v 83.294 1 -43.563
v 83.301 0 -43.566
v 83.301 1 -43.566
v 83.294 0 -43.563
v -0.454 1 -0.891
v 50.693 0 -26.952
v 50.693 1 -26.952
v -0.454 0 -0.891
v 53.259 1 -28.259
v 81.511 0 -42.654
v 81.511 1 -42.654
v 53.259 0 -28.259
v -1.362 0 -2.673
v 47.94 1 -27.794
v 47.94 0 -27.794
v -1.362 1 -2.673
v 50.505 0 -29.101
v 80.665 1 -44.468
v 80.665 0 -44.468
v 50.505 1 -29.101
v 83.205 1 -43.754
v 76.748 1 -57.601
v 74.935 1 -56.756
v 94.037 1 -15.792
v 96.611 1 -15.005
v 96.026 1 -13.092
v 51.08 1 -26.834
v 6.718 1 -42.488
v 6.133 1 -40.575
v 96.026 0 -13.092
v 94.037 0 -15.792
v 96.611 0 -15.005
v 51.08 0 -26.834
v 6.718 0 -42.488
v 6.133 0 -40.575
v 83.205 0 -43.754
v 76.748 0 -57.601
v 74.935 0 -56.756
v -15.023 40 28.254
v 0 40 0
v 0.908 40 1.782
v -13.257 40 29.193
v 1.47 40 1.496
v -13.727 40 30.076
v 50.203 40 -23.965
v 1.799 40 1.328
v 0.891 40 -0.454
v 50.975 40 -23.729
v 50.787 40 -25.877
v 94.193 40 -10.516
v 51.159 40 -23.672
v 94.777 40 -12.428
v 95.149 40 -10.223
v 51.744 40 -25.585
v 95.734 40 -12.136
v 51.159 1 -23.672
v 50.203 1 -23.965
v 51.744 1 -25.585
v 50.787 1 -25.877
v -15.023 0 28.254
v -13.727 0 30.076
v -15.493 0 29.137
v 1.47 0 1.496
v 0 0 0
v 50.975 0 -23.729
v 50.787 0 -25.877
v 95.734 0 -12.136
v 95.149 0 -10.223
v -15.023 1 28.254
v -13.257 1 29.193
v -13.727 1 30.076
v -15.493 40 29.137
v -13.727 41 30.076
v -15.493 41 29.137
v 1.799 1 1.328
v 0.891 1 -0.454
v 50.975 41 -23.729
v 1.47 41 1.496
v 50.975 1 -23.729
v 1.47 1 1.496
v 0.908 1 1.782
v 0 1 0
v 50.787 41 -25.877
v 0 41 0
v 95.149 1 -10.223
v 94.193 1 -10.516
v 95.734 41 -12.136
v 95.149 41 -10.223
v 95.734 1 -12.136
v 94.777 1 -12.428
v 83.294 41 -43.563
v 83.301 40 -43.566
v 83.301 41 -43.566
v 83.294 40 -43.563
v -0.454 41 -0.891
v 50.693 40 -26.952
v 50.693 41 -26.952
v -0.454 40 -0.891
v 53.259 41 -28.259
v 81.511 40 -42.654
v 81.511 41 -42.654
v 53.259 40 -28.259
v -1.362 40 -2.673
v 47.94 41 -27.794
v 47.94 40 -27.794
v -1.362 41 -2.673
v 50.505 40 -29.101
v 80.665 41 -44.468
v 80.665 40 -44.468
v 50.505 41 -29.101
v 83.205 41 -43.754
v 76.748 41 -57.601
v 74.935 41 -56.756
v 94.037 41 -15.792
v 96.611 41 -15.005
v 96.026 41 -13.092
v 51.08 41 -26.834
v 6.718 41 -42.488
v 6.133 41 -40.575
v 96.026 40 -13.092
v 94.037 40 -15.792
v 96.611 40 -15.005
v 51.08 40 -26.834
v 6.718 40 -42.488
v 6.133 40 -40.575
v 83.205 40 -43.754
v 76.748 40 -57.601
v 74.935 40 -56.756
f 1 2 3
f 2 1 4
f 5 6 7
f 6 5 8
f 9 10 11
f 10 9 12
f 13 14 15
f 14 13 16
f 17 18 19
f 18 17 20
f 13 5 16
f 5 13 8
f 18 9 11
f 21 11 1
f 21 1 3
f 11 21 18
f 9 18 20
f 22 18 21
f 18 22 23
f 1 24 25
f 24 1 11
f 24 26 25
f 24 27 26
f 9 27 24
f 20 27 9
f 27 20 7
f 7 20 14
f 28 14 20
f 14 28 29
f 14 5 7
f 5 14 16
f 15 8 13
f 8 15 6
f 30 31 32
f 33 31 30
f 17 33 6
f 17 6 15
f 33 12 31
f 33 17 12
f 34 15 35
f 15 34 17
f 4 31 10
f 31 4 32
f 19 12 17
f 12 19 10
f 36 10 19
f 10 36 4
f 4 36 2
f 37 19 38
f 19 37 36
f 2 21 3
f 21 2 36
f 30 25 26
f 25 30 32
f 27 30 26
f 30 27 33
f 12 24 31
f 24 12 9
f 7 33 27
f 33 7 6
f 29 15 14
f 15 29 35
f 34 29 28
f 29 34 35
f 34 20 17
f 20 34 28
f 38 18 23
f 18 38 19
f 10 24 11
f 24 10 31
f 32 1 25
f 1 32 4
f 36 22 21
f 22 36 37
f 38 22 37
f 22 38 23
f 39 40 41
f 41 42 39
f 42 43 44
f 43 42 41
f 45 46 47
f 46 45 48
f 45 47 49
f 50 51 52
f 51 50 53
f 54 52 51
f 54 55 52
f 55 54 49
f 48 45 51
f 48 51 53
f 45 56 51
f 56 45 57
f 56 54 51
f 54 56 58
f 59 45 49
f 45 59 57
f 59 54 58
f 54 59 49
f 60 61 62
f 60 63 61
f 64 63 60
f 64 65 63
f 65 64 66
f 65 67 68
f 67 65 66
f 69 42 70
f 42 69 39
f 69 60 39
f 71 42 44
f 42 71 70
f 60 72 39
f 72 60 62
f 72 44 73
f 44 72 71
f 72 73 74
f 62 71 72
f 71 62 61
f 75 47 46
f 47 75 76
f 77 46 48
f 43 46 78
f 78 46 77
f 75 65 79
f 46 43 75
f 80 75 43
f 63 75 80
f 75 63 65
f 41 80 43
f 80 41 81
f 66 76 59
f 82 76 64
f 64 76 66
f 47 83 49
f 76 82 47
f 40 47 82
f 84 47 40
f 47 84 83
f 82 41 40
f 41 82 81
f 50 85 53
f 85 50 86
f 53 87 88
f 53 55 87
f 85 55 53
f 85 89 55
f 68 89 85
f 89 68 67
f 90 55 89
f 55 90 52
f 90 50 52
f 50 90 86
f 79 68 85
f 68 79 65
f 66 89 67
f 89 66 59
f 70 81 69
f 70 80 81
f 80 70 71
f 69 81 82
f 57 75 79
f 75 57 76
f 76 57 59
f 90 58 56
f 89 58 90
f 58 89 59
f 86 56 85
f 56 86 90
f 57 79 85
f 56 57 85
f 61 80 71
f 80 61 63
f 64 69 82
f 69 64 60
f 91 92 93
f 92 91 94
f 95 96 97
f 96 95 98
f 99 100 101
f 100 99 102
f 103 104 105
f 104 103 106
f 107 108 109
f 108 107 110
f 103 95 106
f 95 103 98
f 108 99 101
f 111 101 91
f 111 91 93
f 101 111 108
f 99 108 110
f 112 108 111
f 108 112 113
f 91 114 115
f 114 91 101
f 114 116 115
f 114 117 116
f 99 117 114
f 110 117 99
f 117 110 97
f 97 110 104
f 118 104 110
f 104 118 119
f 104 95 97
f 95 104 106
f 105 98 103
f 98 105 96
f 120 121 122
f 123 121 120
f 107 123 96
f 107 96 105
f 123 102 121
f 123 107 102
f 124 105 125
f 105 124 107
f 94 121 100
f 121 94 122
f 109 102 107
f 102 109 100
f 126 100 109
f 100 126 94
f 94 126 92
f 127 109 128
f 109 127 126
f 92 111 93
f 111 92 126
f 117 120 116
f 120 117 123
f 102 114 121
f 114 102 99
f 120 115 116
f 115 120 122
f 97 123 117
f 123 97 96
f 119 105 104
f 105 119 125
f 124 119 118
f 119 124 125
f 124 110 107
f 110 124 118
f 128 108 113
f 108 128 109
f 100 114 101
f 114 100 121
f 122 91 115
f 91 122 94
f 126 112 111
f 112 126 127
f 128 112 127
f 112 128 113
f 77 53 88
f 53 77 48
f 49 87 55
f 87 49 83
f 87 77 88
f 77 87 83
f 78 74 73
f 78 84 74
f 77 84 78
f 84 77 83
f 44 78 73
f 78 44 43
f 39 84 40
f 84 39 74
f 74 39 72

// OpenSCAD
angle_body_head=145;
angle_body_rest=136;

//angle_body_floor=27;
angle_body_floor=27;

length_head=33;
length_body=57;
length_rest=47;

thickness_wood=1;
thickness_stretcher=1;
height_wood=2;

space_base=1;
common_angle_base=0;

chair_width=40;

module rotate_about(v,a) {
translate(v) rotate(a) translate(-v) children(0);
}

module rotate_about_debug(v,a) {
    translate(-v) children(0);
}

module side() {
    //feet
    translate([length_body, 0, 0]){
        rotate(a=[0,-(180-angle_body_rest),0]) {
            cube([length_rest,thickness_wood,height_wood]);
        }
    }

    //body
    cube([length_body,thickness_wood,height_wood]);

    //head
    rotate(a=[0,180-angle_body_head,0]) {
        translate([-length_head, 0,0]){
            cube([length_head,thickness_wood,height_wood]);
        }
    }
}



module stretchers() {
    

    
//feet-body stretcher
translate([length_body, 
    0,
    0]){
    rotate(a=[0,-(180-angle_body_rest),0]) {
        cube([thickness_stretcher,chair_width,height_wood]);
    }
}

//head stretcher
rotate(a=[0,180-angle_body_head,0]) {
    translate([-length_head, 0,0]){
        cube([thickness_stretcher,chair_width,height_wood]);
    }
}

//head-body stretcher

    cube([thickness_stretcher,chair_width,height_wood]);


//feet stretcher
translate([length_body + 
    cos(180-angle_body_rest)*(length_rest -thickness_stretcher)
    , 
    0,
    +sin(180-angle_body_rest)*(length_rest -thickness_stretcher)
    ]){
    rotate(a=[0,-(180-angle_body_rest),0]) {
        cube([thickness_stretcher,chair_width,height_wood]);
    }
}
}




module base() {
    
module feet_base() {
    translate([
    length_body+cos(-90+angle_body_rest)*(height_wood+space_base),
    0,
    -sin(-90-angle_body_rest)*(height_wood+space_base)
    ]){
        rotate(a=[0,-(180-angle_body_rest),0]) {
            cube([length_rest,thickness_wood,height_wood]);
        }
    }
}
    
//body renfort
translate([0, 0, -height_wood-space_base]){
        cube([length_body,thickness_wood,height_wood]);
}

//body support
translate([length_body-sin(common_angle_base)*height_wood,
    0,
    -cos(common_angle_base)*height_wood-space_base
]){
    rotate(a=[0,common_angle_base,0]) {
        cube([length_rest-10,thickness_wood,height_wood]);
    }
}

//feet renfort
feet_base();

//feet support
rotate_about([
    length_body-cos(-90-angle_body_rest)*space_base,
    0,
    -sin(-90-angle_body_rest)*space_base], 
    [0,-common_angle_base,0]) {
    translate([
        length_body+
            cos(angle_body_rest-90)*(height_wood+space_base)
            -sin(angle_body_rest-90)*(length_rest),
        0,
        - sin(angle_body_rest-90)*(height_wood+space_base)
            +sin(-(180-angle_body_rest))*length_rest
    ]){
        rotate(a=[0,-(180-angle_body_rest),0]) {
            cube([length_rest,thickness_wood,height_wood]);
        }
    }
}

//feet front
rotate_about([
    length_body+cos(180-angle_body_rest)*length_rest
        +sin(180-angle_body_rest)*(height_wood+space_base),
    0,
    sin(180-angle_body_rest)*length_rest
        -cos(180-angle_body_rest)*(height_wood+space_base)], 
    [0,-48,0]) {
    feet_base();
}





}

rotate(a=[0,angle_body_floor,0]) {
base();
stretchers();

side();


translate([0,chair_width,0]) {
    base();
    side();
}
}
